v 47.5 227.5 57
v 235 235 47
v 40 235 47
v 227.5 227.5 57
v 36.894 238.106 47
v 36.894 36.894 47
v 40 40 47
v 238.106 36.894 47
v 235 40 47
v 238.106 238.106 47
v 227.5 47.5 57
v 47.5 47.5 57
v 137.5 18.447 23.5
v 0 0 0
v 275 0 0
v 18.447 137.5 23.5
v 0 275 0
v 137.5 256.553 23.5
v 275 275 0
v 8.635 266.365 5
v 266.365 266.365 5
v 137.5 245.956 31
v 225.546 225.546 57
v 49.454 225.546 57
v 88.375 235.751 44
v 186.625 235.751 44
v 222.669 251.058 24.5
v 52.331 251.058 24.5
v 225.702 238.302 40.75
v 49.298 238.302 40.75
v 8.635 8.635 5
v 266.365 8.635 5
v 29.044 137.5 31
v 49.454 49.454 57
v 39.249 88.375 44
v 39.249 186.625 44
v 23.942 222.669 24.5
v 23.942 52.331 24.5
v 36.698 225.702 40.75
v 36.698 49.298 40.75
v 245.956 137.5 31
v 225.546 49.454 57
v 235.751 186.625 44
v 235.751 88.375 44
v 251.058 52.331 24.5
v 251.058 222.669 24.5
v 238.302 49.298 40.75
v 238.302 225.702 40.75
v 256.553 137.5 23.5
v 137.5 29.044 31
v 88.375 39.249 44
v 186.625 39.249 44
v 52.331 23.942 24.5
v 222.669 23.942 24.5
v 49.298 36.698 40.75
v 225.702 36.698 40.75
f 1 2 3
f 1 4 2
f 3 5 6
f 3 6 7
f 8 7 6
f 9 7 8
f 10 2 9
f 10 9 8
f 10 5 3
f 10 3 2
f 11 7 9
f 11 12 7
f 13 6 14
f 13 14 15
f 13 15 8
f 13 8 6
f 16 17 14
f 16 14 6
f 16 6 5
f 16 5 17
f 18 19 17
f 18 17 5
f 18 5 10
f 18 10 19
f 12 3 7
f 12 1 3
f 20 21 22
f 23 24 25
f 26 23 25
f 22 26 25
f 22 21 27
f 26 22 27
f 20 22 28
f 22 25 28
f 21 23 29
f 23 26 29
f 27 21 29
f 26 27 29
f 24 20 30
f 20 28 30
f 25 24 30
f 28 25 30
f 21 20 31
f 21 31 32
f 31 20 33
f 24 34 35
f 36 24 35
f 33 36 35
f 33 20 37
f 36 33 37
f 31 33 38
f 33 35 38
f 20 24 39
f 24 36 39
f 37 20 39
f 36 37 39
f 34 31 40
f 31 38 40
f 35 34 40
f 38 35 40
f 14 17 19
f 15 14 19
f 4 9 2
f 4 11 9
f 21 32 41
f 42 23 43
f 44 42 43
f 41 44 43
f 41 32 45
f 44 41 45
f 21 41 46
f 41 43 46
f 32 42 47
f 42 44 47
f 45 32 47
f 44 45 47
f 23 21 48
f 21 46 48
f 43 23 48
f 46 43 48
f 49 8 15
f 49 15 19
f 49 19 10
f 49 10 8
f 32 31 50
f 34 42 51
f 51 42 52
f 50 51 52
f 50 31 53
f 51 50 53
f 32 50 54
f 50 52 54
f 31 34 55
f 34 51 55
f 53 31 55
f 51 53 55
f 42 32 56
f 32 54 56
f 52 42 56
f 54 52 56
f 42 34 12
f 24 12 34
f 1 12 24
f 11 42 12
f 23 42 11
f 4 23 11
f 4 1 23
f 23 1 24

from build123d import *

# Parameters (mm, degrees)
BOX002_W     = 275
BOX002_H     = 275
BOX002_DEPTH = 47
SKETCH022_W  = 195
SKETCH022_H  = 195
SKETCH023_W  = 180
SKETCH023_H  = 180
BOX001_W     = 275
BOX001_H     = 275
BOX001_DEPTH = 52
SKETCH020_W  = 275
SKETCH020_H  = 275
SKETCH021_W  = 0.1
SKETCH021_H  = 0.1
SKETCH018_W  = 275
SKETCH018_H  = 275
SKETCH019_W  = 0.1
SKETCH019_H  = 0.1
BOX_W        = 275
BOX_H        = 275
BOX_DEPTH    = 57


with BuildPart() as layer0keep001:
    # Box002 → Box002 (new body)
    with BuildSketch(Plane.XY):
        with Locations((137.5, 137.5)):
            Rectangle(BOX002_W, BOX002_H)
    extrude(amount=BOX002_DEPTH)


with BuildPart() as layer003:
    # Sketch022 → Loft003 section 0
    with BuildSketch(Plane.XY.offset(47)):
        with Locations((137.5, 137.5)):
            Rectangle(SKETCH022_W, SKETCH022_H)
    # Sketch023 → Loft003 section 1
    with BuildSketch(Plane.XY.offset(57)):
        with Locations((137.5, 137.5)):
            Rectangle(SKETCH023_W, SKETCH023_H)
    loft()

    # Fusion015: union layer0Keep001
    add(layer0keep001.part)


with BuildPart() as layer002:
    # Box001 → Box001 (new body)
    with BuildSketch(Plane.XY.offset(5)):
        with Locations((137.5, 137.5)):
            Rectangle(BOX001_W, BOX001_H)
    extrude(amount=BOX001_DEPTH)


with BuildPart() as layer0cut:
    # Sketch020 → Loft002 section 0
    with BuildSketch(Plane.XY):
        with Locations((137.5, 137.5)):
            Rectangle(SKETCH020_W, SKETCH020_H)
    # Sketch021 → Loft002 section 1
    with BuildSketch(Plane.XY.offset(175.1)):
        with Locations((137.5, 137.5)):
            Rectangle(SKETCH021_W, SKETCH021_H)
    loft()


with BuildPart() as layer0cut_1:
    # Loft002 placement: moved
    add(layer0cut.part.moved(Location((0, 0, -6))))

    # Common001: intersect layer002
    add(layer002.part, mode=Mode.INTERSECT)


with BuildPart() as outerlayer001:
    # Sketch018 → Loft001 section 0
    with BuildSketch(Plane.XY):
        with Locations((137.5, 137.5)):
            Rectangle(SKETCH018_W, SKETCH018_H)
    # Sketch019 → Loft001 section 1
    with BuildSketch(Plane.XY.offset(175.1)):
        with Locations((137.5, 137.5)):
            Rectangle(SKETCH019_W, SKETCH019_H)
    loft()


with BuildPart() as layerzero:
    # Box → Box (new body)
    with BuildSketch(Plane.XY):
        with Locations((137.5, 137.5)):
            Rectangle(BOX_W, BOX_H)
    extrude(amount=BOX_DEPTH)

    # Common: intersect outerLayer001
    add(outerlayer001.part, mode=Mode.INTERSECT)

    # Cut: cut layer0cut
    add(layer0cut_1.part, mode=Mode.SUBTRACT)

    # Common002: intersect layer003
    add(layer003.part, mode=Mode.INTERSECT)


solid = layerzero.part
